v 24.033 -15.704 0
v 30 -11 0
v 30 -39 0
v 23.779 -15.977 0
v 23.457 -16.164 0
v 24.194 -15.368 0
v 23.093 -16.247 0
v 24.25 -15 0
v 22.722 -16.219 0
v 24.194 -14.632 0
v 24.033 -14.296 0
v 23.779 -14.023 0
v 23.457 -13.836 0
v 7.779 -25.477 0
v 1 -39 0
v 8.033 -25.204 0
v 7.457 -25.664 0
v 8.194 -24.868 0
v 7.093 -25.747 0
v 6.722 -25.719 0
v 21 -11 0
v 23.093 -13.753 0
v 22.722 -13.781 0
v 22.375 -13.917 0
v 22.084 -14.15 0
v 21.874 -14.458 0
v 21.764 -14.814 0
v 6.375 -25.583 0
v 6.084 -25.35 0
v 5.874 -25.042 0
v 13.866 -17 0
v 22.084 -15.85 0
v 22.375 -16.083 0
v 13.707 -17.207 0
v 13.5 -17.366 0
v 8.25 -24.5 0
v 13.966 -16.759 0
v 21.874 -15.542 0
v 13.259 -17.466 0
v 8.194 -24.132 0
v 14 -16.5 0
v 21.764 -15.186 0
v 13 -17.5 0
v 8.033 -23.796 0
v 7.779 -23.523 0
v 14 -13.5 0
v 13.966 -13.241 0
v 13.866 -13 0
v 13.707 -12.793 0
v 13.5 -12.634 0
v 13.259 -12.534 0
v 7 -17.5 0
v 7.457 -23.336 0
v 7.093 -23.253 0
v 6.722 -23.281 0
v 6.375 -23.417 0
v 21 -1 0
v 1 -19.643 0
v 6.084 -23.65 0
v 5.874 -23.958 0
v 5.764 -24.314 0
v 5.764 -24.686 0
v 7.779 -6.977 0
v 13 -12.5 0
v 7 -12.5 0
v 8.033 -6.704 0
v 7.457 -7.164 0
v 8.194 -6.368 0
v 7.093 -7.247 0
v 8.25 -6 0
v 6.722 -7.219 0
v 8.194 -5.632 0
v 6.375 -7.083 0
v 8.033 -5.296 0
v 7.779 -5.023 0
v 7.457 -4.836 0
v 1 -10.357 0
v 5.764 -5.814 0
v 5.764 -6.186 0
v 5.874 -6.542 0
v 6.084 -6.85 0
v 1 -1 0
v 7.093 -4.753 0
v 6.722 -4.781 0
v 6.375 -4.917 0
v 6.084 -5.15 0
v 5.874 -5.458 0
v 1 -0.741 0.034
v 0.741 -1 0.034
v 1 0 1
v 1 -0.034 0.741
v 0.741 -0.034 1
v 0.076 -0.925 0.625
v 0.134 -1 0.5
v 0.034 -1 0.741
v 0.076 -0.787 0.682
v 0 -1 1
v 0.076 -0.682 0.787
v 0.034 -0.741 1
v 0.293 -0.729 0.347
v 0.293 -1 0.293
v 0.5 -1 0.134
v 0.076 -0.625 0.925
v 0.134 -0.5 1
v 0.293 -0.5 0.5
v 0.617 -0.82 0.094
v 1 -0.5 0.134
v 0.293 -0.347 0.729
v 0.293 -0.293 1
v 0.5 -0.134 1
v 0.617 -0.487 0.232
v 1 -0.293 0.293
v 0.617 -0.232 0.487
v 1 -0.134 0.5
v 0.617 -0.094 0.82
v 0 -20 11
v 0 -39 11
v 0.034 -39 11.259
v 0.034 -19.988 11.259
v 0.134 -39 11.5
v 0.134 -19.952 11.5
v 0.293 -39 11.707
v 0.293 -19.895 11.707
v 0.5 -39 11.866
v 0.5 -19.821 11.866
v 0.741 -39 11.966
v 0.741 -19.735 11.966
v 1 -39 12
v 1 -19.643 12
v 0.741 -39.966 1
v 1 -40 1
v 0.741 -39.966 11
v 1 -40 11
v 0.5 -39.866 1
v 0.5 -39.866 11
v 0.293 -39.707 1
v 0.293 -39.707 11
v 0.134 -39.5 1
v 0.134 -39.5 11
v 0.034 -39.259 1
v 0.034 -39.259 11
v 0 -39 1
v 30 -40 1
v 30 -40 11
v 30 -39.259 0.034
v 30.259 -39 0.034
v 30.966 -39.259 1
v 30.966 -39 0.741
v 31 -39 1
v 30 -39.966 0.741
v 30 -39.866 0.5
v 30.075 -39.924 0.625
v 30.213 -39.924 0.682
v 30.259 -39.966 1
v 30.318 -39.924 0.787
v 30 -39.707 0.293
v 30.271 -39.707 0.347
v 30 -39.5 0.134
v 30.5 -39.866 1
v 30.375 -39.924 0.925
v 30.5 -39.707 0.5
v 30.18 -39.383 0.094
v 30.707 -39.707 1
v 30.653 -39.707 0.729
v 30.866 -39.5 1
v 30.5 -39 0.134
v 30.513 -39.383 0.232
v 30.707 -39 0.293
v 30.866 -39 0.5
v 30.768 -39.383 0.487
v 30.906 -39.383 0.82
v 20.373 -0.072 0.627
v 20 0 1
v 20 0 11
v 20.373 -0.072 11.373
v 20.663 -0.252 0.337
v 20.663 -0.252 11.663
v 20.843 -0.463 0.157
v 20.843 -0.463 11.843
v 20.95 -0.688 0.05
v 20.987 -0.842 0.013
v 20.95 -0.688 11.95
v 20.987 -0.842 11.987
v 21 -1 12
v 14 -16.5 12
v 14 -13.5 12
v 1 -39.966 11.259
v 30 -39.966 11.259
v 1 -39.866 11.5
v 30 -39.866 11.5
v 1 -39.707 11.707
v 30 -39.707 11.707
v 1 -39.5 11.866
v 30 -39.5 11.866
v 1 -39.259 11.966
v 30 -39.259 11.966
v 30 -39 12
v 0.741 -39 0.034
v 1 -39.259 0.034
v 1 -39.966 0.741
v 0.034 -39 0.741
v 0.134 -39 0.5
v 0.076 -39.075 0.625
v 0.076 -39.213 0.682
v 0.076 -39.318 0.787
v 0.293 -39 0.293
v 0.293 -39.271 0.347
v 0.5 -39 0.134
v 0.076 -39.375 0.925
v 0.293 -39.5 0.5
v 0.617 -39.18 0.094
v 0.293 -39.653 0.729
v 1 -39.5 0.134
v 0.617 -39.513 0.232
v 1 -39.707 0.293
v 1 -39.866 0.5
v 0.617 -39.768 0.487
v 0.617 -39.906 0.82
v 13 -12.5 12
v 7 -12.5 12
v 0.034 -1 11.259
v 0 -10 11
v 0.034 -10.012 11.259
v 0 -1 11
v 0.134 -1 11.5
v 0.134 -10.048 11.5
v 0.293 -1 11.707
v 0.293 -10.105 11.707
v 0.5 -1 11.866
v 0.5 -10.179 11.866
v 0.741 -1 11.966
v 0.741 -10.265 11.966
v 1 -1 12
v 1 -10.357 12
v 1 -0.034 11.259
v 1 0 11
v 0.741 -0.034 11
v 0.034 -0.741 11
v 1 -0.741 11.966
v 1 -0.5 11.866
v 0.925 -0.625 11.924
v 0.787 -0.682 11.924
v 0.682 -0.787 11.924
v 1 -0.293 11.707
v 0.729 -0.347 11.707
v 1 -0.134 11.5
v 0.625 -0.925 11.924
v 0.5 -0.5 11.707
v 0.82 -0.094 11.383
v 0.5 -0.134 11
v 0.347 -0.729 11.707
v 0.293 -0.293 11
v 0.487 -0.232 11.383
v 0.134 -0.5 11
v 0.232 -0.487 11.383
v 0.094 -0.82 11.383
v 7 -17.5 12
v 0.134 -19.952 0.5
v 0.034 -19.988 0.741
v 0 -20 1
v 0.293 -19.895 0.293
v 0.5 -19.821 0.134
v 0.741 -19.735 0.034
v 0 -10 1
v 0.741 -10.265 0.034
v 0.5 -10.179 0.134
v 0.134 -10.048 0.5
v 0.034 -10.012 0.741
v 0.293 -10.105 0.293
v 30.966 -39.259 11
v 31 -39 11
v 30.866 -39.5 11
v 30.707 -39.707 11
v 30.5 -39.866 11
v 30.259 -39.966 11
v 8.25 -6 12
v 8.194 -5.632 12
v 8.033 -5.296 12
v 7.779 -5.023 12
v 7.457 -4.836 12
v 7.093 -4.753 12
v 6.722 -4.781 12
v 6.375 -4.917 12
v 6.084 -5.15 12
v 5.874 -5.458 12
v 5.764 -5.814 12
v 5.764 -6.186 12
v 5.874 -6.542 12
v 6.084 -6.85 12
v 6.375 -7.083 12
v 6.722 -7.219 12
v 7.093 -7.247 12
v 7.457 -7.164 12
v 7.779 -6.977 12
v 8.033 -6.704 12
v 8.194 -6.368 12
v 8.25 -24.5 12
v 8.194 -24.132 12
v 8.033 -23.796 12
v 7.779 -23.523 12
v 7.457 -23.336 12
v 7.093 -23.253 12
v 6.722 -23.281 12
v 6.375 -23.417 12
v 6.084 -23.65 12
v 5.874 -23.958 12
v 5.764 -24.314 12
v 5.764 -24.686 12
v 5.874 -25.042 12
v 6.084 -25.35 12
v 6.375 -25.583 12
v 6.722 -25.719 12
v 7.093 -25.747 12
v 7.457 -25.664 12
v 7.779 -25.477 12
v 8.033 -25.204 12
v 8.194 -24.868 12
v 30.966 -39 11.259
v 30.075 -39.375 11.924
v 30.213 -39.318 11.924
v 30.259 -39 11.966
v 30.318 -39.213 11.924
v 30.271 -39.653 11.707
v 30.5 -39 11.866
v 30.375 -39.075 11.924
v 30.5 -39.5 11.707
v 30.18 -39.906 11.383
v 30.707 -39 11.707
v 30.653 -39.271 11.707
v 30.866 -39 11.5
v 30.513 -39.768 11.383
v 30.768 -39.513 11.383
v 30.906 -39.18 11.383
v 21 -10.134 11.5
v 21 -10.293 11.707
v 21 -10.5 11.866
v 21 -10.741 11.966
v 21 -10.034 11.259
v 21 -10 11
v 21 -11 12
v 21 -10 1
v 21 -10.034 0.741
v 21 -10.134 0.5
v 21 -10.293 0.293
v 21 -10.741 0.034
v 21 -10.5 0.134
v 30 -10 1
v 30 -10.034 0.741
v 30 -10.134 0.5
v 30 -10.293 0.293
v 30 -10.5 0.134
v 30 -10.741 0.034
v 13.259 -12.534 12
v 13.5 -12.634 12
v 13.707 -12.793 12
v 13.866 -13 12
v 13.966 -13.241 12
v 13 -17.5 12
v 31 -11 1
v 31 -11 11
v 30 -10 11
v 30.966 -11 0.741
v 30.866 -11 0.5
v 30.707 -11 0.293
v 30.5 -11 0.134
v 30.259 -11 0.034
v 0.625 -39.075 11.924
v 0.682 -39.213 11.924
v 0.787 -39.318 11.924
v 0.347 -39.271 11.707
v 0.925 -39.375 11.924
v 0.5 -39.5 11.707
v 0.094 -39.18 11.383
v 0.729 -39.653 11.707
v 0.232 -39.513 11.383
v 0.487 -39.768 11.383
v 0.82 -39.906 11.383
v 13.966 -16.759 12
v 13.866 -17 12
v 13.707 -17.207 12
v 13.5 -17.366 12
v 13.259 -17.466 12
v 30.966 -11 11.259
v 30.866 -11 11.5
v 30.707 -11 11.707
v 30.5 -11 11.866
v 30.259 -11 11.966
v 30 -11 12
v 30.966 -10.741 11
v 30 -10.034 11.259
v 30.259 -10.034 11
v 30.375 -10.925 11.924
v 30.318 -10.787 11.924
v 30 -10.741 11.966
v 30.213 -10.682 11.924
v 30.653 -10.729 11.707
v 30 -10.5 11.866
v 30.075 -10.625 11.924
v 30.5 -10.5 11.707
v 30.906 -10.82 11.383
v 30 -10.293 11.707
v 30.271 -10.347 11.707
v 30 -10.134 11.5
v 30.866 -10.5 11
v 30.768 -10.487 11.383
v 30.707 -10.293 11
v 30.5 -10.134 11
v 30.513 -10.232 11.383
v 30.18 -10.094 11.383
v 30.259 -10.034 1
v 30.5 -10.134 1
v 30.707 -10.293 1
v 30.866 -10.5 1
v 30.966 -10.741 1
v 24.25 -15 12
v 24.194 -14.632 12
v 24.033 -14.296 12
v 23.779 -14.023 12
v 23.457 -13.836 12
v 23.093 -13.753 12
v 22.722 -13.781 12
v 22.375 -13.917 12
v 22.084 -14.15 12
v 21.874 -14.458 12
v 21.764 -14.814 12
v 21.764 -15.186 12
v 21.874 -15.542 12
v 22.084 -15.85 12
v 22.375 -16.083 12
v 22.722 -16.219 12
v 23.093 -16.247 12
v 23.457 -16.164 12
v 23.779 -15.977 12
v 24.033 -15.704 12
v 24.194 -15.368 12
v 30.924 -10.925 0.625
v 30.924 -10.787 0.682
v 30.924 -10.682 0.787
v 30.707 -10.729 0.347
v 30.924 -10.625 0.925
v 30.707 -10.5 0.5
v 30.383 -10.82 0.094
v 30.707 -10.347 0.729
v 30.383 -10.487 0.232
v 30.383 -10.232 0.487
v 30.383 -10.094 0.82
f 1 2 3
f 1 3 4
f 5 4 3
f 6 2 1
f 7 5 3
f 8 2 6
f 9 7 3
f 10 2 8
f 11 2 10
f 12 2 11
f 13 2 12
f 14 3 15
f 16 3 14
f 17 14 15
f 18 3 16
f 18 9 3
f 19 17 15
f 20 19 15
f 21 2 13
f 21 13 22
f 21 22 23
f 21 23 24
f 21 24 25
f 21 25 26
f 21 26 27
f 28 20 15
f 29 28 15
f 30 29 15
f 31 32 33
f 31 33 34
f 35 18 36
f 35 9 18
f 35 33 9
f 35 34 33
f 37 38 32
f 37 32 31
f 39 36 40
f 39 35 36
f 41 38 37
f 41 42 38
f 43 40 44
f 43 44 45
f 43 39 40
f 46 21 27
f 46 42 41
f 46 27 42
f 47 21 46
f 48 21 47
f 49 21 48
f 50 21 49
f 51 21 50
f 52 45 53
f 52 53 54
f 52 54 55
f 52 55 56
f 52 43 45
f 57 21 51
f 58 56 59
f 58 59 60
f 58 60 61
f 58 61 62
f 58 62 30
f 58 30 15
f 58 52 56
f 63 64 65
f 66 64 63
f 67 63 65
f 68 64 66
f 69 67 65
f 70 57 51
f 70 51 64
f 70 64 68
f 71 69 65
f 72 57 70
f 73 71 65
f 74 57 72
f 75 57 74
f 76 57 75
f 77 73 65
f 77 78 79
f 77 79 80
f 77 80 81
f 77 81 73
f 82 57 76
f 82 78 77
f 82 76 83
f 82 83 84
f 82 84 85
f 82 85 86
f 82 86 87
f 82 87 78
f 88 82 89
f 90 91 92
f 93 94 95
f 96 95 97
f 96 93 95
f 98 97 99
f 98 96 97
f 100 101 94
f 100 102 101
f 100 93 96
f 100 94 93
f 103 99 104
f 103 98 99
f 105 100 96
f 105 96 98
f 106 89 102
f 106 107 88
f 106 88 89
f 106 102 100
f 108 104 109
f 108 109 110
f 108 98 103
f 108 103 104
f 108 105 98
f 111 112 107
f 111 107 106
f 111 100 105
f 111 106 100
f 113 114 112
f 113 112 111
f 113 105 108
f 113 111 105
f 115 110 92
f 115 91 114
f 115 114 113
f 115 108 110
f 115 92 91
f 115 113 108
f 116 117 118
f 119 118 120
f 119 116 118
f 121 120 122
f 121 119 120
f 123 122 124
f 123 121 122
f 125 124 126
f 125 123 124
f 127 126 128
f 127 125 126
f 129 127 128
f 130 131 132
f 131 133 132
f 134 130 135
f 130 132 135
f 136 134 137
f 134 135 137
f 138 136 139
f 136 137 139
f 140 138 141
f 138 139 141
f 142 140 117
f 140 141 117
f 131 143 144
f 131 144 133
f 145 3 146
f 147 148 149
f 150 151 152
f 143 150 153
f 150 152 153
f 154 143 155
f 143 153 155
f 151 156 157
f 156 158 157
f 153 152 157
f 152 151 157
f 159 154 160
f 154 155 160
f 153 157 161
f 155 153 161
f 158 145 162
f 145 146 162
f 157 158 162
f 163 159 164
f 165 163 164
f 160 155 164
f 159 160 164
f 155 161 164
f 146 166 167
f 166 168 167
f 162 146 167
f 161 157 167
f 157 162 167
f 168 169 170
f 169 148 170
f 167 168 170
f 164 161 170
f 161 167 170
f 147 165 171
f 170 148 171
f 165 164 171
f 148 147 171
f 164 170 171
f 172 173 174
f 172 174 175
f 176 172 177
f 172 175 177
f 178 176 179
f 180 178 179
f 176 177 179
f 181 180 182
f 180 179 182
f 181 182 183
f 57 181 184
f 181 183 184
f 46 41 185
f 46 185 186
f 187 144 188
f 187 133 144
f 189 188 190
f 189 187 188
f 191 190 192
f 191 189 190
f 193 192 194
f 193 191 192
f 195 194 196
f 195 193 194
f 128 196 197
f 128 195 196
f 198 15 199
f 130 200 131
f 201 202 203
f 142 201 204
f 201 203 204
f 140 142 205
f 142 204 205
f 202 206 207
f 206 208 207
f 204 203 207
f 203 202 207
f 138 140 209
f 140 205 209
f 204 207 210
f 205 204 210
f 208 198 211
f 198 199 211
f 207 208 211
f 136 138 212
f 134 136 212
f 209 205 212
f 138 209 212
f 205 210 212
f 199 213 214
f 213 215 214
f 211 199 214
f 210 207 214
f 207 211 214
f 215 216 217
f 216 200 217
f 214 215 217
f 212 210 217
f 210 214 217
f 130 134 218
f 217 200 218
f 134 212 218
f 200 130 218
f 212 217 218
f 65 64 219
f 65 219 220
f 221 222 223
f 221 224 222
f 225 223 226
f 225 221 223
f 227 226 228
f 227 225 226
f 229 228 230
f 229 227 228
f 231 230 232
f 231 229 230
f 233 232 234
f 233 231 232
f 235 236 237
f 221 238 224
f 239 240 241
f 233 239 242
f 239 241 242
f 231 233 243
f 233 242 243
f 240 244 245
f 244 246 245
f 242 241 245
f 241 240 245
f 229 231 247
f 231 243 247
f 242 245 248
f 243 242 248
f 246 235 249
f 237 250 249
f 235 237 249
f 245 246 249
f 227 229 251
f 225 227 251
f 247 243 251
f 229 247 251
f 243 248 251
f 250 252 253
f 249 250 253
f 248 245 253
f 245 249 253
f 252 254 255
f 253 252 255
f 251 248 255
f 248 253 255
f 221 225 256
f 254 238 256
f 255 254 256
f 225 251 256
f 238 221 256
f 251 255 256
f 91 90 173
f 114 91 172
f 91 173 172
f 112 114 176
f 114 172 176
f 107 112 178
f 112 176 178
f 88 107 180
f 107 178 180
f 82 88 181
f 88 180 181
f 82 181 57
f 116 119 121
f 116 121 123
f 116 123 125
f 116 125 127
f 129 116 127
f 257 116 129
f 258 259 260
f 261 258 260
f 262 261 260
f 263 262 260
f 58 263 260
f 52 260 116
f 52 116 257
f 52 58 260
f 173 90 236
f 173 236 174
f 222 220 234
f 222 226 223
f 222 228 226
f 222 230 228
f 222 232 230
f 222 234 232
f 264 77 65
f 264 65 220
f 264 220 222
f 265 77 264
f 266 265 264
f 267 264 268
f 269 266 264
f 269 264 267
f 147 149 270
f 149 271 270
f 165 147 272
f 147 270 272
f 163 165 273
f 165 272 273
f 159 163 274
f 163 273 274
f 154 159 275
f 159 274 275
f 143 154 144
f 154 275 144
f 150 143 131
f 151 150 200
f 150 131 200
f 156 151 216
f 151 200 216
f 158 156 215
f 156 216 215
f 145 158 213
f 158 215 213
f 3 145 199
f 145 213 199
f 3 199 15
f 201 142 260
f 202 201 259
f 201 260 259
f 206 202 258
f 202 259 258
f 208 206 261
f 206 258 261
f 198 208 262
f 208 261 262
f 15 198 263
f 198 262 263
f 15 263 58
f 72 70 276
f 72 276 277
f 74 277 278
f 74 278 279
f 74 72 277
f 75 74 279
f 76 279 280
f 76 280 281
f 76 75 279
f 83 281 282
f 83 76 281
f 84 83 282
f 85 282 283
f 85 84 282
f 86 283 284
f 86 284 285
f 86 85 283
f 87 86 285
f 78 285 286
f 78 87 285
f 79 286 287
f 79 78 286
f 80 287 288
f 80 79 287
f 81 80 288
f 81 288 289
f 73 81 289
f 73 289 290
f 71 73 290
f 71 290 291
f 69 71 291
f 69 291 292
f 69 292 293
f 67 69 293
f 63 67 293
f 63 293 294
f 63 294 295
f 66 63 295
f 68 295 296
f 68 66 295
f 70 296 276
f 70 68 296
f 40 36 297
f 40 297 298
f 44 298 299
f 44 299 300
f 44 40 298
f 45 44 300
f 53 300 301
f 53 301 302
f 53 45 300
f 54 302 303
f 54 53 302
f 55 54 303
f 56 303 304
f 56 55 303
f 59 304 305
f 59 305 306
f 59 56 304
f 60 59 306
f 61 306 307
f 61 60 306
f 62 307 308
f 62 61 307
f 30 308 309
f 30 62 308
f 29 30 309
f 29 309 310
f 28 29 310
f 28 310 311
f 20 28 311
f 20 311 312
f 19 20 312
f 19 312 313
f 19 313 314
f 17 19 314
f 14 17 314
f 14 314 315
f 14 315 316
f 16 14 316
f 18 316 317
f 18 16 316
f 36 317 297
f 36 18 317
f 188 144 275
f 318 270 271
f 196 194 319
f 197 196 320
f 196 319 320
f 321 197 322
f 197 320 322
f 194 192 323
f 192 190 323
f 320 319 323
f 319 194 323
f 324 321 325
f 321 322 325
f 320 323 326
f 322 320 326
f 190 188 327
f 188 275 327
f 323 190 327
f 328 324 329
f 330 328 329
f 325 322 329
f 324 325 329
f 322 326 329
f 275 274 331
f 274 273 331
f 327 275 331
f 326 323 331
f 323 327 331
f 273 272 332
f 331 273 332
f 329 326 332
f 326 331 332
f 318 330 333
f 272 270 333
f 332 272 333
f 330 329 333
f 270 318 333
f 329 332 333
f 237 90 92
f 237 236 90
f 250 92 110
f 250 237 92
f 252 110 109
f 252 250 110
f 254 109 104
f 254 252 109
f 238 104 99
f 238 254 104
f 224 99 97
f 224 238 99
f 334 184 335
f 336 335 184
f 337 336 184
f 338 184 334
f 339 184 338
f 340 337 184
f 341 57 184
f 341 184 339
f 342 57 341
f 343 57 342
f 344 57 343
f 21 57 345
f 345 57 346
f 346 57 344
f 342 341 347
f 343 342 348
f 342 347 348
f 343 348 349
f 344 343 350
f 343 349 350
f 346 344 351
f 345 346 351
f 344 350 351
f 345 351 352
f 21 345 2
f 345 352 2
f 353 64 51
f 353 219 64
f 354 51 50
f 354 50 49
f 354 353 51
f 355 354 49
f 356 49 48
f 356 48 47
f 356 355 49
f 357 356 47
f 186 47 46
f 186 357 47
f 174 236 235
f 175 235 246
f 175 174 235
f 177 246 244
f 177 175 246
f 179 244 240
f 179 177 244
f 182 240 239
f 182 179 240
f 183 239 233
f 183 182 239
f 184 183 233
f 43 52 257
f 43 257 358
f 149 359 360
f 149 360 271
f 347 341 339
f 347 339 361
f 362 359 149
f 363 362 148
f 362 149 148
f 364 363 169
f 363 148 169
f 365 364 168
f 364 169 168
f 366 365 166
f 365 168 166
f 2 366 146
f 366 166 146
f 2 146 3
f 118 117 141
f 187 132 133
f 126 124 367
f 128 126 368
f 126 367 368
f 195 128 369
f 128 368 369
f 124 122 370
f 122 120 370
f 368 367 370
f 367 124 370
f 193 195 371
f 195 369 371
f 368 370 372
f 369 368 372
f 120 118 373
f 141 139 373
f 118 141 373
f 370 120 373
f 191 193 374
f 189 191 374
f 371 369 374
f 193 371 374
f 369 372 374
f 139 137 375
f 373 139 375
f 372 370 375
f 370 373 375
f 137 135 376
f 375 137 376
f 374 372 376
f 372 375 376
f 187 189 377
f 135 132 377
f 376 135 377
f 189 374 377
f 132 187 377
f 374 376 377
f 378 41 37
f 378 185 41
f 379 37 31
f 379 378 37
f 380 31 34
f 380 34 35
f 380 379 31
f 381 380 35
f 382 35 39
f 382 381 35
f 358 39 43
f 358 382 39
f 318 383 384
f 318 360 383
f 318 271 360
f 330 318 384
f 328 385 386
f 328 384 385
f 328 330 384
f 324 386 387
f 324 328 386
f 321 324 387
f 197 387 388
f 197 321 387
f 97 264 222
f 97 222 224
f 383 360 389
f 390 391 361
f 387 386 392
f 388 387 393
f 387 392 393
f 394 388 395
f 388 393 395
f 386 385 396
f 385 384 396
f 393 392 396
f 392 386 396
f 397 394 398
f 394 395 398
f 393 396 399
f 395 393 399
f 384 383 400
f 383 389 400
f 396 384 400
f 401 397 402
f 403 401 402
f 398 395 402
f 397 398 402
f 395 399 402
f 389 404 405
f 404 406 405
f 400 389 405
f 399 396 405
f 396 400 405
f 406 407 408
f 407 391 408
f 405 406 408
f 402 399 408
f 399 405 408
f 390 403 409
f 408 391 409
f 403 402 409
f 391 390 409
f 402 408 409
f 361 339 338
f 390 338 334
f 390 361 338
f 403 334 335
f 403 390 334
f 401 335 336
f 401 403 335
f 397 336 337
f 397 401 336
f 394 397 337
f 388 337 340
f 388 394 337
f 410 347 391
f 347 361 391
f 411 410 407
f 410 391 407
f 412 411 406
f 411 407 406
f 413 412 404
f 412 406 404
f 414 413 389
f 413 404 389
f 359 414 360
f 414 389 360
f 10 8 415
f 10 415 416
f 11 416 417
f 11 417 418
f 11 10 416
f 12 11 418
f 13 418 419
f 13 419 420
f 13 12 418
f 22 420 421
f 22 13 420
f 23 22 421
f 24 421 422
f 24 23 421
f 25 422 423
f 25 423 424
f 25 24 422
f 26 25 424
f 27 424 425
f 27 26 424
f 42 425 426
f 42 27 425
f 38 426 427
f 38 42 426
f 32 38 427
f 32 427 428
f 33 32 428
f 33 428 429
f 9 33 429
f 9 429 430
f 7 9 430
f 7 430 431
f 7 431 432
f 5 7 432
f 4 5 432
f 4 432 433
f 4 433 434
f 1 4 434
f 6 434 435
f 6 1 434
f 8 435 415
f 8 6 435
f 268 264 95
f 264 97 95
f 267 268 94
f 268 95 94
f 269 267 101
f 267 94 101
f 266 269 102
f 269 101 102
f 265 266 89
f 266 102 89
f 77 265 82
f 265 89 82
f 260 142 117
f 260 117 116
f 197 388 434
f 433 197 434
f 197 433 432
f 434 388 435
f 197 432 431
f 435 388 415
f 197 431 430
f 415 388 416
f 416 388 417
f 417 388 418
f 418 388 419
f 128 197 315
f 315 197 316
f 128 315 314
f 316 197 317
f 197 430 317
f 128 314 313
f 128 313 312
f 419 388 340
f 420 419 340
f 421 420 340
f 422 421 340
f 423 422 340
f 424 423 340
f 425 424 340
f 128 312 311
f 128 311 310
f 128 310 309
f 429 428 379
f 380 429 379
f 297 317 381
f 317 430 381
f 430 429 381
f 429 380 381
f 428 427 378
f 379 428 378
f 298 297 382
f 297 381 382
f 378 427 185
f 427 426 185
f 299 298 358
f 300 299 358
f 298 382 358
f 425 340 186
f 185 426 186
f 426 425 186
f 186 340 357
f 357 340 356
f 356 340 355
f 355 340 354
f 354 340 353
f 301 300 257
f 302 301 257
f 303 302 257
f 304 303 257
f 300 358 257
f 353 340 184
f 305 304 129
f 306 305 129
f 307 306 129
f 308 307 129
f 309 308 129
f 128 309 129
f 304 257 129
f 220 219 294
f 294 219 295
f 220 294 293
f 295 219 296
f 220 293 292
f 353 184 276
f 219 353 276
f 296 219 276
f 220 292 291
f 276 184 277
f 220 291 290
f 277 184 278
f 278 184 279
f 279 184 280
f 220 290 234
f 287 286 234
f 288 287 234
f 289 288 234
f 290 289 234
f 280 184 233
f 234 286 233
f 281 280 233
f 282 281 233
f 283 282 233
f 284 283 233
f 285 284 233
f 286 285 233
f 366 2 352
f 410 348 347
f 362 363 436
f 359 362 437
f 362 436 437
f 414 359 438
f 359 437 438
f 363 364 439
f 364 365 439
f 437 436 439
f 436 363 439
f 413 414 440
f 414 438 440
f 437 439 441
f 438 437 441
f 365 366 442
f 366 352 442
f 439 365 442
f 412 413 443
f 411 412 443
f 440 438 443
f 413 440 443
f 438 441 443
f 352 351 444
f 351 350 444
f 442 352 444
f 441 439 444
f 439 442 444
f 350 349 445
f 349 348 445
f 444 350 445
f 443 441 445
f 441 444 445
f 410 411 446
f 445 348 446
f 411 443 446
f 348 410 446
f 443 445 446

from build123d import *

# Parameters (mm, degrees)
SKETCH_1_R      = 1.25
EXTRUDE_1_DEPTH = 12
FILLET_1_R      = 1


with BuildPart() as part:
    # 草图1 → 凸台-拉伸1 (new body)
    with BuildSketch(Plane.XY):
        Polygon((0, 0), (21, 0), (21, -10), (31, -10), (31, -40), (0, -40), (0, -20), (7, -17.5), (14, -17.5), (14, -12.5), (7, -12.5), (0, -10), align=None)
        with Locations((7, -6)):
            Circle(SKETCH_1_R, mode=Mode.SUBTRACT)
        with Locations((23, -15)):
            Circle(SKETCH_1_R, mode=Mode.SUBTRACT)
        with Locations((7, -24.5)):
            Circle(SKETCH_1_R, mode=Mode.SUBTRACT)
    extrude(amount=EXTRUDE_1_DEPTH)

    # 圆角1
    fillet_1_edges = [part.edges().sort_by_distance(p)[0] for p in [
        (10.5, 0, 0),
        (26, -10, 0),
        (31, -25, 0),
        (15.5, -40, 0),
        (0, -30, 0),
        (0, -5, 0),
        (0, 0, 6),
        (21, 0, 6),
        (31, -10, 6),
        (31, -40, 6),
        (0, -40, 6),
        (14, -17.5, 6),
        (14, -12.5, 6),
        (0, -30, 12),
        (15.5, -40, 12),
        (31, -25, 12),
        (26, -10, 12),
        (10.5, 0, 12),
        (0, -5, 12),
    ]]
    fillet(fillet_1_edges, radius=FILLET_1_R)


solid = part.part
